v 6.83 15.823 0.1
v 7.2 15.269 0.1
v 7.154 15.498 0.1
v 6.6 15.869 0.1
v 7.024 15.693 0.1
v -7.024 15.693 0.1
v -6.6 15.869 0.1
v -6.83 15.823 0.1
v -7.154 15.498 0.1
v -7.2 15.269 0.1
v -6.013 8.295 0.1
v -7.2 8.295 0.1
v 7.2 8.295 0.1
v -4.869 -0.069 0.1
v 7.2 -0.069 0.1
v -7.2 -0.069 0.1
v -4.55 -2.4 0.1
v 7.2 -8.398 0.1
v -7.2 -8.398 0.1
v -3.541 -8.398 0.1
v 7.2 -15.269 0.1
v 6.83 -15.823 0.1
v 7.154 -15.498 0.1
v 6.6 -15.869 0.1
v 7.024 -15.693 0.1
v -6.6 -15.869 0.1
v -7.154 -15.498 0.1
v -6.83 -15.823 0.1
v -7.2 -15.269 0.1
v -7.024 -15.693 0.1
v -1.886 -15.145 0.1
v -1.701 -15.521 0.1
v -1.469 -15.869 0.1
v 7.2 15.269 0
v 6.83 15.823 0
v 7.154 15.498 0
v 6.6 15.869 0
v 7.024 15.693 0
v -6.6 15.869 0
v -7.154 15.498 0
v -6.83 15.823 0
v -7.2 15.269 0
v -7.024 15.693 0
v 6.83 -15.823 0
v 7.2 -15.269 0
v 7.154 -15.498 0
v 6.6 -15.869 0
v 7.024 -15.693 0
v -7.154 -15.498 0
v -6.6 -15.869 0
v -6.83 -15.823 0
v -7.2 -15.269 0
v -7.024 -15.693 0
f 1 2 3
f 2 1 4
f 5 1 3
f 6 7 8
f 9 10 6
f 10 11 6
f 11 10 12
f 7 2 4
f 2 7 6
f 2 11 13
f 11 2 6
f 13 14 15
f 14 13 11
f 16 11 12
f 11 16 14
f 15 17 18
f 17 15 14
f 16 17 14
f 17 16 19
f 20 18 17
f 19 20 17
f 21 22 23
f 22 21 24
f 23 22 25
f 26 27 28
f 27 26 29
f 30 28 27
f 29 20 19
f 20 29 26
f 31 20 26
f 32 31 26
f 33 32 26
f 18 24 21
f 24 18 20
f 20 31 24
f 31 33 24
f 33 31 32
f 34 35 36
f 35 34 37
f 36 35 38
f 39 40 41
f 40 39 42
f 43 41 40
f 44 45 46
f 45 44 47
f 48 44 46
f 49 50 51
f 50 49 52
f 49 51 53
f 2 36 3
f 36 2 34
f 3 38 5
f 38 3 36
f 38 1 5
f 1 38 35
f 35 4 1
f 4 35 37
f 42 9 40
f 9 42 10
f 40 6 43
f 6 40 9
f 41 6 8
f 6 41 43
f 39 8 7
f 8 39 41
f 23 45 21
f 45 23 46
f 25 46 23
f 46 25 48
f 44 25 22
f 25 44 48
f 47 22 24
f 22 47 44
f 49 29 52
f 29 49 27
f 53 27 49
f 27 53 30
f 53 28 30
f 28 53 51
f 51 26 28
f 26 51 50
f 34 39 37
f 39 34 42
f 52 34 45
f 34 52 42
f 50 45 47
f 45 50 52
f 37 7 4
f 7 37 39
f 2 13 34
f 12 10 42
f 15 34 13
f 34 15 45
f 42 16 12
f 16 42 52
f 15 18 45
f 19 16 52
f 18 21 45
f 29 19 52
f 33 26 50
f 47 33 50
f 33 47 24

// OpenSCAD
// file: ../p/1-4cyli.scad
use <../lib.scad>
function ldraw_lib__1_4cyli() = [
// 0 Cylinder 0.25
// 0 Name: 1-4cyli.dat
// 0 Author: James Jessiman
// 0 !LDRAW_ORG Primitive UPDATE 2012-01
// 0 !LICENSE Licensed under CC BY 4.0 : see CAreadme.txt
// 
// 0 BFC CERTIFY CCW
  [0,"BFC","CERTIFY"],
  [0,"BFC","CCW"],
// 
// 0 !HISTORY 2002-03-23 [sbliss] Added BFC statement.
// 0 !HISTORY 2002-04-25 [PTadmin] Official Update 2002-02
// 0 !HISTORY 2007-06-22 [PTadmin] Header formatted for Contributor Agreement
// 0 !HISTORY 2008-07-01 [PTadmin] Official Update 2008-01
// 0 !HISTORY 2012-02-16 [Philo] Changed to CCW
// 0 !HISTORY 2012-03-30 [PTadmin] Official Update 2012-01
// 
// 
// 4 16 1 1 0 0.9239 1 0.3827 0.9239 0 0.3827 1 0 0
  [4,16,1,1,0,0.9239,1,0.3827,0.9239,0,0.3827,1,0,0],
// 5 24 1 0 0 1 1 0 0.9239 0 0.3827 1 0 -1
  [5,24,1,0,0,1,1,0,0.9239,0,0.3827,1,0,-1],
// 4 16 0.9239 1 0.3827 0.7071 1 0.7071 0.7071 0 0.7071 0.9239 0 0.3827
  [4,16,0.9239,1,0.3827,0.7071,1,0.7071,0.7071,0,0.7071,0.9239,0,0.3827],
// 5 24 0.9239 0 0.3827 0.9239 1 0.3827 0.7071 0 0.7071 1 0 0
  [5,24,0.9239,0,0.3827,0.9239,1,0.3827,0.7071,0,0.7071,1,0,0],
// 4 16 0.7071 1 0.7071 0.3827 1 0.9239 0.3827 0 0.9239 0.7071 0 0.7071
  [4,16,0.7071,1,0.7071,0.3827,1,0.9239,0.3827,0,0.9239,0.7071,0,0.7071],
// 5 24 0.7071 0 0.7071 0.7071 1 0.7071 0.3827 0 0.9239 0.9239 0 0.3827
  [5,24,0.7071,0,0.7071,0.7071,1,0.7071,0.3827,0,0.9239,0.9239,0,0.3827],
// 4 16 0.3827 1 0.9239 0 1 1 0 0 1 0.3827 0 0.9239
  [4,16,0.3827,1,0.9239,0,1,1,0,0,1,0.3827,0,0.9239],
// 5 24 0.3827 0 0.9239 0.3827 1 0.9239 0 0 1 0.7071 0 0.7071
  [5,24,0.3827,0,0.9239,0.3827,1,0.9239,0,0,1,0.7071,0,0.7071],
// 5 24 0 0 1 0 1 1 0.3827 0 0.9239 -1 0 1
  [5,24,0,0,1,0,1,1,0.3827,0,0.9239,-1,0,1],
];
module ldraw_lib__1_4cyli(step=0, col=false, unit=2/5, alt=false, line=0.2, solid=!$preview)
    makepoly(ldraw_lib__1_4cyli(), step=step, col=col, unit=unit, alt=alt, line=line, solid=solid);
ldraw_lib__1_4cyli(line=0.2);
// file: ../p/1-8chrd.scad
use <../lib.scad>
function ldraw_lib__1_8chrd() = [
// 0 Chord 0.125
// 0 Name: 1-8chrd.dat
// 0 Author: Andy Westrate [westrate]
// 0 !LDRAW_ORG Primitive UPDATE 2004-02
// 0 !LICENSE Licensed under CC BY 2.0 and CC BY 4.0 : see CAreadme.txt
// 
// 0 BFC CERTIFY CCW
  [0,"BFC","CERTIFY"],
  [0,"BFC","CCW"],
// 
// 0 !HISTORY 2004-04-22 [PTadmin] Official Update 2004-02
// 0 !HISTORY 2007-06-22 [PTadmin] Header formatted for Contributor Agreement
// 0 !HISTORY 2008-07-01 [PTadmin] Official Update 2008-01
// 
// 
// 3 16 0.7071 0 0.7071 1 0 0 0.9239 0 0.3827
  [3,16,0.7071,0,0.7071,1,0,0,0.9239,0,0.3827],
// 
// 0
];
module ldraw_lib__1_8chrd(step=0, col=false, unit=2/5, alt=false, line=0.2, solid=!$preview)
    makepoly(ldraw_lib__1_8chrd(), step=step, col=col, unit=unit, alt=alt, line=line, solid=solid);
ldraw_lib__1_8chrd(line=0.2);
// file: ../p/1-4chrd.scad
use <../lib.scad>
function ldraw_lib__1_4chrd() = [
// 0 Chord 0.25
// 0 Name: 1-4chrd.dat
// 0 Author: Tony Hafner [hafhead]
// 0 !LDRAW_ORG Primitive UPDATE 2012-02
// 0 !LICENSE Licensed under CC BY 2.0 and CC BY 4.0 : see CAreadme.txt
// 
// 0 BFC CERTIFY CCW
  [0,"BFC","CERTIFY"],
  [0,"BFC","CCW"],
// 
// 0 !HISTORY 2004-04-22 [PTadmin] Official Update 2004-02
// 0 !HISTORY 2007-10-09 [PTadmin] Header formatted for Contributor Agreement
// 0 !HISTORY 2008-07-01 [PTadmin] Official Update 2008-01
// 0 !HISTORY 2012-08-02 [MMR1988] Re-creation with PrimGen2 and Rectifier
// 0 !HISTORY 2012-08-09 [PTadmin] Official Update 2012-02
// 
// 
// 4 16 0.9239 0 0.3827 0.3827 0 0.9239 0 0 1 1 0 0
  [4,16,0.9239,0,0.3827,0.3827,0,0.9239,0,0,1,1,0,0],
// 3 16 0.7071 0 0.7071 0.3827 0 0.9239 0.9239 0 0.3827
  [3,16,0.7071,0,0.7071,0.3827,0,0.9239,0.9239,0,0.3827],
];
module ldraw_lib__1_4chrd(step=0, col=false, unit=2/5, alt=false, line=0.2, solid=!$preview)
    makepoly(ldraw_lib__1_4chrd(), step=step, col=col, unit=unit, alt=alt, line=line, solid=solid);
ldraw_lib__1_4chrd(line=0.2);
// file: s/6142622ts05.scad
use <../../lib.scad>
use <../../p/1-4chrd.scad>
use <../../p/1-4cyli.scad>
function ldraw_lib__s__6142622ts05() = [
// 0 ~Sticker  4.0 x  1.8 with Black Arch on Yellow Background Right - Underside Flat
// 0 Name: s\6142622ts05.dat
// 0 Author: Massimo Maso [Sirio]
// 0 !LDRAW_ORG Subpart UPDATE 2022-03
// 0 !LICENSE Licensed under CC BY 4.0 : see CAreadme.txt
// 
// 0 BFC CERTIFY CCW
  [0,"BFC","CERTIFY"],
  [0,"BFC","CCW"],
// 
// 0 !HISTORY 2022-05-07 [PTadmin] Official Update 2022-03
// 
// 
// 0 // Primitives
// 
// 1 16 -16.5 0 38.1717 -1.5 0 0 0 -1 0 0 0 1.5 1-4chrd.dat
  [1,16,-16.5,0,38.1717,-1.5,0,0,0,-1,0,0,0,1.5, ldraw_lib__1_4chrd()],
// 1 16 16.5 0 38.1717 1.5 0 0 0 -1 0 0 0 1.5 1-4chrd.dat
  [1,16,16.5,0,38.1717,1.5,0,0,0,-1,0,0,0,1.5, ldraw_lib__1_4chrd()],
// 1 16 -16.5 0 -38.1717 -1.5 0 0 0 -1 0 0 0 -1.5 1-4chrd.dat
  [1,16,-16.5,0,-38.1717,-1.5,0,0,0,-1,0,0,0,-1.5, ldraw_lib__1_4chrd()],
// 1 16 16.5 0 -38.1717 1.5 0 0 0 -1 0 0 0 -1.5 1-4chrd.dat
  [1,16,16.5,0,-38.1717,1.5,0,0,0,-1,0,0,0,-1.5, ldraw_lib__1_4chrd()],
// 1 16 -16.5 -0.25 38.1717 -1.5 0 0 0 0.25 0 0 0 1.5 1-4cyli.dat
  [1,16,-16.5,-0.25,38.1717,-1.5,0,0,0,0.25,0,0,0,1.5, ldraw_lib__1_4cyli()],
// 1 16 16.5 -0.25 38.1717 1.5 0 0 0 0.25 0 0 0 1.5 1-4cyli.dat
  [1,16,16.5,-0.25,38.1717,1.5,0,0,0,0.25,0,0,0,1.5, ldraw_lib__1_4cyli()],
// 1 16 -16.5 -0.25 -38.1717 -1.5 0 0 0 0.25 0 0 0 -1.5 1-4cyli.dat
  [1,16,-16.5,-0.25,-38.1717,-1.5,0,0,0,0.25,0,0,0,-1.5, ldraw_lib__1_4cyli()],
// 1 16 16.5 -0.25 -38.1717 1.5 0 0 0 0.25 0 0 0 -1.5 1-4cyli.dat
  [1,16,16.5,-0.25,-38.1717,1.5,0,0,0,0.25,0,0,0,-1.5, ldraw_lib__1_4cyli()],
// 0 // Bottom face
// 4 16 16.5 0 39.6717 18 0 38.1717 -18 0 38.1717 -16.5 0 39.6717
  [4,16,16.5,0,39.6717,18,0,38.1717,-18,0,38.1717,-16.5,0,39.6717],
// 4 16 18 0 38.1717 18 0 -38.1717 -18 0 -38.1717 -18 0 38.1717
  [4,16,18,0,38.1717,18,0,-38.1717,-18,0,-38.1717,-18,0,38.1717],
// 4 16 -18 0 -38.1717 18 0 -38.1717 16.5 0 -39.6717 -16.5 0 -39.6717
  [4,16,-18,0,-38.1717,18,0,-38.1717,16.5,0,-39.6717,-16.5,0,-39.6717],
// 0 // Lateral faces
// 4 16 16.5 0 39.6717 -16.5 0 39.6717 -16.5 -.25 39.6717 16.5 -.25 39.6717
  [4,16,16.5,0,39.6717,-16.5,0,39.6717,-16.5,-.25,39.6717,16.5,-.25,39.6717],
// 3 16 -18 0 38.1717 -18 -.25 20.737 -18 -.25 38.1717
  [3,16,-18,0,38.1717,-18,-.25,20.737,-18,-.25,38.1717],
// 3 16 18 0 38.1717 18 -.25 38.1717 18 -.25 20.737
  [3,16,18,0,38.1717,18,-.25,38.1717,18,-.25,20.737],
// 4 16 -18 0 38.1717 -18 0 -38.1717 -18 -.25 -.1714 -18 -.25 20.737
  [4,16,-18,0,38.1717,-18,0,-38.1717,-18,-.25,-.1714,-18,-.25,20.737],
// 4 16 18 0 38.1717 18 -.25 20.737 18 -.25 -.1714 18 0 -38.1717
  [4,16,18,0,38.1717,18,-.25,20.737,18,-.25,-.1714,18,0,-38.1717],
// 3 16 -18 0 -38.1717 -18 -.25 -20.994 -18 -.25 -.1714
  [3,16,-18,0,-38.1717,-18,-.25,-20.994,-18,-.25,-.1714],
// 3 16 18 0 -38.1717 18 -.25 -.1714 18 -.25 -20.994
  [3,16,18,0,-38.1717,18,-.25,-.1714,18,-.25,-20.994],
// 3 16 -18 0 -38.1717 -18 -.25 -38.1717 -18 -.25 -20.994
  [3,16,-18,0,-38.1717,-18,-.25,-38.1717,-18,-.25,-20.994],
// 3 16 18 0 -38.1717 18 -.25 -20.994 18 -.25 -38.1717
  [3,16,18,0,-38.1717,18,-.25,-20.994,18,-.25,-38.1717],
// 3 16 16.5 0 -39.6717 16.5 -.25 -39.6717 3.6722 -.25 -39.6717
  [3,16,16.5,0,-39.6717,16.5,-.25,-39.6717,3.6722,-.25,-39.6717],
// 4 16 16.5 0 -39.6717 3.6722 -.25 -39.6717 -16.5 -.25 -39.6717 -16.5 0 -39.6717
  [4,16,16.5,0,-39.6717,3.6722,-.25,-39.6717,-16.5,-.25,-39.6717,-16.5,0,-39.6717],
];
module ldraw_lib__s__6142622ts05(step=0, col=false, unit=2/5, alt=false, line=0.2, solid=!$preview)
    makepoly(ldraw_lib__s__6142622ts05(), step=step, col=col, unit=unit, alt=alt, line=line, solid=solid);
ldraw_lib__s__6142622ts05(line=0.2);
// file: s/6142622ts04.scad
use <../../lib.scad>
use <../../p/1-4chrd.scad>
function ldraw_lib__s__6142622ts04() = [
// 0 ~Sticker  4.0 x  1.8 with Black Arch on Yellow Background Right - Upper Section 4
// 0 Name: s\6142622ts04.dat
// 0 Author: Massimo Maso [Sirio]
// 0 !LDRAW_ORG Subpart UPDATE 2022-03
// 0 !LICENSE Licensed under CC BY 4.0 : see CAreadme.txt
// 
// 0 BFC CERTIFY CCW
  [0,"BFC","CERTIFY"],
  [0,"BFC","CCW"],
// 
// 0 !HISTORY 2022-05-07 [PTadmin] Official Update 2022-03
// 
// 
// 0 // Primitives
// 
// 1 0 -16.5 -.25 -17.162 -1.5 0 0 0 1 0 0 0 -1.5 1-4chrd.dat
  [1,0,-16.5,-.25,-17.162,-1.5,0,0,0,1,0,0,0,-1.5, ldraw_lib__1_4chrd()],
// 1 14 16.5 -.25 -17.162 1.5 0 0 0 1 0 0 0 -1.5 1-4chrd.dat
  [1,14,16.5,-.25,-17.162,1.5,0,0,0,1,0,0,0,-1.5, ldraw_lib__1_4chrd()],
// 0 // Yellow faces
// 4 14 16.5 -.25 -18.662 18 -.25 -17.162 18 -.25 .0157 8.8524 -.25 .0157
  [4,14,16.5,-.25,-18.662,18,-.25,-17.162,18,-.25,.0157,8.8524,-.25,.0157],
// 3 14 16.5 -.25 -18.662 8.8524 -.25 .0157 4.7162 -.25 -16.8532
  [3,14,16.5,-.25,-18.662,8.8524,-.25,.0157,4.7162,-.25,-16.8532],
// 3 14 16.5 -.25 -18.662 4.7162 -.25 -16.8532 4.253 -.25 -17.7916
  [3,14,16.5,-.25,-18.662,4.7162,-.25,-16.8532,4.253,-.25,-17.7916],
// 3 14 16.5 -.25 -18.662 4.253 -.25 -17.7916 3.6722 -.25 -18.662
  [3,14,16.5,-.25,-18.662,4.253,-.25,-17.7916,3.6722,-.25,-18.662],
// 0 // Black faces
// 4 0 -16.5 -.25 -18.662 8.8524 -.25 .0157 -18 -.25 .0157 -18 -.25 -17.162
  [4,0,-16.5,-.25,-18.662,8.8524,-.25,.0157,-18,-.25,.0157,-18,-.25,-17.162],
// 3 0 -16.5 -.25 -18.662 4.7162 -.25 -16.8532 8.8524 -.25 .0157
  [3,0,-16.5,-.25,-18.662,4.7162,-.25,-16.8532,8.8524,-.25,.0157],
// 4 0 -16.5 -.25 -18.662 3.6722 -.25 -18.662 4.253 -.25 -17.7916 4.7162 -.25 -16.8532
  [4,0,-16.5,-.25,-18.662,3.6722,-.25,-18.662,4.253,-.25,-17.7916,4.7162,-.25,-16.8532],
];
module ldraw_lib__s__6142622ts04(step=0, col=false, unit=2/5, alt=false, line=0.2, solid=!$preview)
    makepoly(ldraw_lib__s__6142622ts04(), step=step, col=col, unit=unit, alt=alt, line=line, solid=solid);
ldraw_lib__s__6142622ts04(line=0.2);
// file: s/6142622ts03.scad
use <../../lib.scad>
function ldraw_lib__s__6142622ts03() = [
// 0 ~Sticker  4.0 x  1.8 with Black Arch on Yellow Background Right - Upper Section 3
// 0 Name: s\6142622ts03.dat
// 0 Author: Massimo Maso [Sirio]
// 0 !LDRAW_ORG Subpart UPDATE 2022-03
// 0 !LICENSE Licensed under CC BY 4.0 : see CAreadme.txt
// 
// 0 BFC CERTIFY CCW
  [0,"BFC","CERTIFY"],
  [0,"BFC","CCW"],
// 
// 0 !HISTORY 2022-05-07 [PTadmin] Official Update 2022-03
// 
// 
// 0 // Faces
// 
// 4 0 11.375 -.25 14.9783 12.1721 -.25 20.8069 -18 -.25 20.8069 -18 -.25 -.0157
  [4,0,11.375,-.25,14.9783,12.1721,-.25,20.8069,-18,-.25,20.8069,-18,-.25,-.0157],
// 4 14 11.375 -.25 14.9783 18 -.25 -.0157 18 -.25 20.8069 12.1721 -.25 20.8069
  [4,14,11.375,-.25,14.9783,18,-.25,-.0157,18,-.25,20.8069,12.1721,-.25,20.8069],
// 3 0 11.375 -.25 14.9783 -18 -.25 -.0157 8.8524 -.25 -.0157
  [3,0,11.375,-.25,14.9783,-18,-.25,-.0157,8.8524,-.25,-.0157],
// 3 14 11.375 -.25 14.9783 8.8524 -.25 -.0157 18 -.25 -.0157
  [3,14,11.375,-.25,14.9783,8.8524,-.25,-.0157,18,-.25,-.0157],
];
module ldraw_lib__s__6142622ts03(step=0, col=false, unit=2/5, alt=false, line=0.2, solid=!$preview)
    makepoly(ldraw_lib__s__6142622ts03(), step=step, col=col, unit=unit, alt=alt, line=line, solid=solid);
ldraw_lib__s__6142622ts03(line=0.2);
// file: s/6142622ts02.scad
use <../../lib.scad>
function ldraw_lib__s__6142622ts02() = [
// 0 ~Sticker  4.0 x  1.8 with Black Arch on Yellow Background Right - Upper Section 2
// 0 Name: s\6142622ts02.dat
// 0 Author: Massimo Maso [Sirio]
// 0 !LDRAW_ORG Subpart UPDATE 2022-03
// 0 !LICENSE Licensed under CC BY 4.0 : see CAreadme.txt
// 
// 0 BFC CERTIFY CCW
  [0,"BFC","CERTIFY"],
  [0,"BFC","CCW"],
// 
// 0 !HISTORY 2022-05-07 [PTadmin] Official Update 2022-03
// 
// 
// 0 // Faces
// 
// 4 0 15.0314 -.25 .0153 -18 -.25 .0153 -18 -.25 -20.8931 12.1721 -.25 -20.8931
  [4,0,15.0314,-.25,.0153,-18,-.25,.0153,-18,-.25,-20.8931,12.1721,-.25,-20.8931],
// 4 14 15.0314 -.25 .0153 12.1721 -.25 -20.8931 18 -.25 -20.8931 18 -.25 .0153
  [4,14,15.0314,-.25,.0153,12.1721,-.25,-20.8931,18,-.25,-20.8931,18,-.25,.0153],
];
module ldraw_lib__s__6142622ts02(step=0, col=false, unit=2/5, alt=false, line=0.2, solid=!$preview)
    makepoly(ldraw_lib__s__6142622ts02(), step=step, col=col, unit=unit, alt=alt, line=line, solid=solid);
ldraw_lib__s__6142622ts02(line=0.2);
// file: s/6142622ts01.scad
use <../../lib.scad>
use <../../p/1-4chrd.scad>
use <../../p/1-8chrd.scad>
function ldraw_lib__s__6142622ts01() = [
// 0 ~Sticker  4.0 x  1.8 with Black Arch on Yellow Background Right - Upper Section 1
// 0 Name: s\6142622ts01.dat
// 0 Author: Massimo Maso [Sirio]
// 0 !LDRAW_ORG Subpart UPDATE 2022-03
// 0 !LICENSE Licensed under CC BY 4.0 : see CAreadme.txt
// 
// 0 BFC CERTIFY CCW
  [0,"BFC","CERTIFY"],
  [0,"BFC","CCW"],
// 
// 0 !HISTORY 2022-05-07 [PTadmin] Official Update 2022-03
// 
// 
// 0 // Primitives
// 
// 1 0 -16.5 -.25 17.4194 -1.5 0 0 0 1 0 0 0 1.5 1-4chrd.dat
  [1,0,-16.5,-.25,17.4194,-1.5,0,0,0,1,0,0,0,1.5, ldraw_lib__1_4chrd()],
// 1 0 16.5 -.25 17.4194 0 0 1.5 0 1 0 1.5 0 0 1-8chrd.dat
  [1,0,16.5,-.25,17.4194,0,0,1.5,0,1,0,1.5,0,0, ldraw_lib__1_8chrd()],
// 1 14 16.5 -.25 17.4194 1.5 0 0 0 1 0 0 0 1.5 1-8chrd.dat
  [1,14,16.5,-.25,17.4194,1.5,0,0,0,1,0,0,0,1.5, ldraw_lib__1_8chrd()],
// 0 // Yellow face
// 4 14 17.56065 -.25 18.48005 15.0314 -.25 -.0153 18 -.25 -.0153 18 -.25 17.4194
  [4,14,17.56065,-.25,18.48005,15.0314,-.25,-.0153,18,-.25,-.0153,18,-.25,17.4194],
// 0 // Black faces
// 4 0 17.56065 -.25 18.48005 16.5 -.25 18.9194 -16.5 -.25 18.9194 -18 -.25 17.4194
  [4,0,17.56065,-.25,18.48005,16.5,-.25,18.9194,-16.5,-.25,18.9194,-18,-.25,17.4194],
// 4 0 17.56065 -.25 18.48005 -18 -.25 17.4194 -18 -.25 -.0153 15.0314 -.25 -.0153
  [4,0,17.56065,-.25,18.48005,-18,-.25,17.4194,-18,-.25,-.0153,15.0314,-.25,-.0153],
];
module ldraw_lib__s__6142622ts01(step=0, col=false, unit=2/5, alt=false, line=0.2, solid=!$preview)
    makepoly(ldraw_lib__s__6142622ts01(), step=step, col=col, unit=unit, alt=alt, line=line, solid=solid);
ldraw_lib__s__6142622ts01(line=0.2);
// file: 6142622t.scad
use <../lib.scad>
use <s/6142622ts01.scad>
use <s/6142622ts02.scad>
use <s/6142622ts03.scad>
use <s/6142622ts04.scad>
use <s/6142622ts05.scad>
function ldraw_lib__6142622t() = [
// 0 Sticker  4.0 x  1.8 with Black Arch on Yellow Background Right
// 0 Name: 6142622t.dat
// 0 Author: Massimo Maso [Sirio]
// 0 !LDRAW_ORG Part UPDATE 2022-03
// 0 !LICENSE Licensed under CC BY 4.0 : see CAreadme.txt
// 
// 0 BFC CERTIFY CCW
  [0,"BFC","CERTIFY"],
  [0,"BFC","CCW"],
// 
// 0 !KEYWORDS Chevrolet, Corvette, Set 75870, Speed Champions
// 
// 0 !HISTORY 2022-05-07 [PTadmin] Official Update 2022-03
// 
// 
// 1 16 0 0 20.7523 1 0 0 0 1 0 0 0 1 s\6142622ts01.dat
  [1,16,0,0,20.7523,1,0,0,0,1,0,0,0,1, ldraw_lib__s__6142622ts01()],
// 1 16 0 0 20.7217 1 0 0 0 1 0 0 0 1 s\6142622ts02.dat
  [1,16,0,0,20.7217,1,0,0,0,1,0,0,0,1, ldraw_lib__s__6142622ts02()],
// 1 16 0 0 -20.9783 1 0 0 0 1 0 0 0 1 s\6142622ts03.dat
  [1,16,0,0,-20.9783,1,0,0,0,1,0,0,0,1, ldraw_lib__s__6142622ts03()],
// 1 16 0 0 -21.0097 1 0 0 0 1 0 0 0 1 s\6142622ts04.dat
  [1,16,0,0,-21.0097,1,0,0,0,1,0,0,0,1, ldraw_lib__s__6142622ts04()],
// 1 16 0 0 0 1 0 0 0 1 0 0 0 1 s\6142622ts05.dat
  [1,16,0,0,0,1,0,0,0,1,0,0,0,1, ldraw_lib__s__6142622ts05()],
];
module ldraw_lib__6142622t(step=0, col=false, unit=2/5, alt=false, line=0.2, solid=!$preview)
    makepoly(ldraw_lib__6142622t(), step=step, col=col, unit=unit, alt=alt, line=line, solid=solid);
ldraw_lib__6142622t(line=0.2);
// main file
use <../lib.scad>
use <6142622t.scad>
function ldraw_lib__6142622s() = [
// 0 Sticker  4.0 x  1.8 with Black Arch on Yellow Background Left
// 0 Name: 6142622s.dat
// 0 Author: Massimo Maso [Sirio]
// 0 !LDRAW_ORG Part UPDATE 2022-03
// 0 !LICENSE Licensed under CC BY 4.0 : see CAreadme.txt
// 
// 0 BFC CERTIFY CCW
  [0,"BFC","CERTIFY"],
  [0,"BFC","CCW"],
// 
// 0 !KEYWORDS Chevrolet, Corvette, Set 75870, Speed Champions
// 
// 0 !HISTORY 2022-05-07 [PTadmin] Official Update 2022-03
// 
// 
// 1 16 0 0 0 -1 0 0 0 1 0 0 0 1 6142622t.dat
  [1,16,0,0,0,-1,0,0,0,1,0,0,0,1, ldraw_lib__6142622t()],
];
module ldraw_lib__6142622s(step=0, col=false, unit=2/5, alt=false, line=0.2, solid=!$preview)
    makepoly(ldraw_lib__6142622s(), step=step, col=col, unit=unit, alt=alt, line=line, solid=solid);
ldraw_lib__6142622s(line=0.2);
